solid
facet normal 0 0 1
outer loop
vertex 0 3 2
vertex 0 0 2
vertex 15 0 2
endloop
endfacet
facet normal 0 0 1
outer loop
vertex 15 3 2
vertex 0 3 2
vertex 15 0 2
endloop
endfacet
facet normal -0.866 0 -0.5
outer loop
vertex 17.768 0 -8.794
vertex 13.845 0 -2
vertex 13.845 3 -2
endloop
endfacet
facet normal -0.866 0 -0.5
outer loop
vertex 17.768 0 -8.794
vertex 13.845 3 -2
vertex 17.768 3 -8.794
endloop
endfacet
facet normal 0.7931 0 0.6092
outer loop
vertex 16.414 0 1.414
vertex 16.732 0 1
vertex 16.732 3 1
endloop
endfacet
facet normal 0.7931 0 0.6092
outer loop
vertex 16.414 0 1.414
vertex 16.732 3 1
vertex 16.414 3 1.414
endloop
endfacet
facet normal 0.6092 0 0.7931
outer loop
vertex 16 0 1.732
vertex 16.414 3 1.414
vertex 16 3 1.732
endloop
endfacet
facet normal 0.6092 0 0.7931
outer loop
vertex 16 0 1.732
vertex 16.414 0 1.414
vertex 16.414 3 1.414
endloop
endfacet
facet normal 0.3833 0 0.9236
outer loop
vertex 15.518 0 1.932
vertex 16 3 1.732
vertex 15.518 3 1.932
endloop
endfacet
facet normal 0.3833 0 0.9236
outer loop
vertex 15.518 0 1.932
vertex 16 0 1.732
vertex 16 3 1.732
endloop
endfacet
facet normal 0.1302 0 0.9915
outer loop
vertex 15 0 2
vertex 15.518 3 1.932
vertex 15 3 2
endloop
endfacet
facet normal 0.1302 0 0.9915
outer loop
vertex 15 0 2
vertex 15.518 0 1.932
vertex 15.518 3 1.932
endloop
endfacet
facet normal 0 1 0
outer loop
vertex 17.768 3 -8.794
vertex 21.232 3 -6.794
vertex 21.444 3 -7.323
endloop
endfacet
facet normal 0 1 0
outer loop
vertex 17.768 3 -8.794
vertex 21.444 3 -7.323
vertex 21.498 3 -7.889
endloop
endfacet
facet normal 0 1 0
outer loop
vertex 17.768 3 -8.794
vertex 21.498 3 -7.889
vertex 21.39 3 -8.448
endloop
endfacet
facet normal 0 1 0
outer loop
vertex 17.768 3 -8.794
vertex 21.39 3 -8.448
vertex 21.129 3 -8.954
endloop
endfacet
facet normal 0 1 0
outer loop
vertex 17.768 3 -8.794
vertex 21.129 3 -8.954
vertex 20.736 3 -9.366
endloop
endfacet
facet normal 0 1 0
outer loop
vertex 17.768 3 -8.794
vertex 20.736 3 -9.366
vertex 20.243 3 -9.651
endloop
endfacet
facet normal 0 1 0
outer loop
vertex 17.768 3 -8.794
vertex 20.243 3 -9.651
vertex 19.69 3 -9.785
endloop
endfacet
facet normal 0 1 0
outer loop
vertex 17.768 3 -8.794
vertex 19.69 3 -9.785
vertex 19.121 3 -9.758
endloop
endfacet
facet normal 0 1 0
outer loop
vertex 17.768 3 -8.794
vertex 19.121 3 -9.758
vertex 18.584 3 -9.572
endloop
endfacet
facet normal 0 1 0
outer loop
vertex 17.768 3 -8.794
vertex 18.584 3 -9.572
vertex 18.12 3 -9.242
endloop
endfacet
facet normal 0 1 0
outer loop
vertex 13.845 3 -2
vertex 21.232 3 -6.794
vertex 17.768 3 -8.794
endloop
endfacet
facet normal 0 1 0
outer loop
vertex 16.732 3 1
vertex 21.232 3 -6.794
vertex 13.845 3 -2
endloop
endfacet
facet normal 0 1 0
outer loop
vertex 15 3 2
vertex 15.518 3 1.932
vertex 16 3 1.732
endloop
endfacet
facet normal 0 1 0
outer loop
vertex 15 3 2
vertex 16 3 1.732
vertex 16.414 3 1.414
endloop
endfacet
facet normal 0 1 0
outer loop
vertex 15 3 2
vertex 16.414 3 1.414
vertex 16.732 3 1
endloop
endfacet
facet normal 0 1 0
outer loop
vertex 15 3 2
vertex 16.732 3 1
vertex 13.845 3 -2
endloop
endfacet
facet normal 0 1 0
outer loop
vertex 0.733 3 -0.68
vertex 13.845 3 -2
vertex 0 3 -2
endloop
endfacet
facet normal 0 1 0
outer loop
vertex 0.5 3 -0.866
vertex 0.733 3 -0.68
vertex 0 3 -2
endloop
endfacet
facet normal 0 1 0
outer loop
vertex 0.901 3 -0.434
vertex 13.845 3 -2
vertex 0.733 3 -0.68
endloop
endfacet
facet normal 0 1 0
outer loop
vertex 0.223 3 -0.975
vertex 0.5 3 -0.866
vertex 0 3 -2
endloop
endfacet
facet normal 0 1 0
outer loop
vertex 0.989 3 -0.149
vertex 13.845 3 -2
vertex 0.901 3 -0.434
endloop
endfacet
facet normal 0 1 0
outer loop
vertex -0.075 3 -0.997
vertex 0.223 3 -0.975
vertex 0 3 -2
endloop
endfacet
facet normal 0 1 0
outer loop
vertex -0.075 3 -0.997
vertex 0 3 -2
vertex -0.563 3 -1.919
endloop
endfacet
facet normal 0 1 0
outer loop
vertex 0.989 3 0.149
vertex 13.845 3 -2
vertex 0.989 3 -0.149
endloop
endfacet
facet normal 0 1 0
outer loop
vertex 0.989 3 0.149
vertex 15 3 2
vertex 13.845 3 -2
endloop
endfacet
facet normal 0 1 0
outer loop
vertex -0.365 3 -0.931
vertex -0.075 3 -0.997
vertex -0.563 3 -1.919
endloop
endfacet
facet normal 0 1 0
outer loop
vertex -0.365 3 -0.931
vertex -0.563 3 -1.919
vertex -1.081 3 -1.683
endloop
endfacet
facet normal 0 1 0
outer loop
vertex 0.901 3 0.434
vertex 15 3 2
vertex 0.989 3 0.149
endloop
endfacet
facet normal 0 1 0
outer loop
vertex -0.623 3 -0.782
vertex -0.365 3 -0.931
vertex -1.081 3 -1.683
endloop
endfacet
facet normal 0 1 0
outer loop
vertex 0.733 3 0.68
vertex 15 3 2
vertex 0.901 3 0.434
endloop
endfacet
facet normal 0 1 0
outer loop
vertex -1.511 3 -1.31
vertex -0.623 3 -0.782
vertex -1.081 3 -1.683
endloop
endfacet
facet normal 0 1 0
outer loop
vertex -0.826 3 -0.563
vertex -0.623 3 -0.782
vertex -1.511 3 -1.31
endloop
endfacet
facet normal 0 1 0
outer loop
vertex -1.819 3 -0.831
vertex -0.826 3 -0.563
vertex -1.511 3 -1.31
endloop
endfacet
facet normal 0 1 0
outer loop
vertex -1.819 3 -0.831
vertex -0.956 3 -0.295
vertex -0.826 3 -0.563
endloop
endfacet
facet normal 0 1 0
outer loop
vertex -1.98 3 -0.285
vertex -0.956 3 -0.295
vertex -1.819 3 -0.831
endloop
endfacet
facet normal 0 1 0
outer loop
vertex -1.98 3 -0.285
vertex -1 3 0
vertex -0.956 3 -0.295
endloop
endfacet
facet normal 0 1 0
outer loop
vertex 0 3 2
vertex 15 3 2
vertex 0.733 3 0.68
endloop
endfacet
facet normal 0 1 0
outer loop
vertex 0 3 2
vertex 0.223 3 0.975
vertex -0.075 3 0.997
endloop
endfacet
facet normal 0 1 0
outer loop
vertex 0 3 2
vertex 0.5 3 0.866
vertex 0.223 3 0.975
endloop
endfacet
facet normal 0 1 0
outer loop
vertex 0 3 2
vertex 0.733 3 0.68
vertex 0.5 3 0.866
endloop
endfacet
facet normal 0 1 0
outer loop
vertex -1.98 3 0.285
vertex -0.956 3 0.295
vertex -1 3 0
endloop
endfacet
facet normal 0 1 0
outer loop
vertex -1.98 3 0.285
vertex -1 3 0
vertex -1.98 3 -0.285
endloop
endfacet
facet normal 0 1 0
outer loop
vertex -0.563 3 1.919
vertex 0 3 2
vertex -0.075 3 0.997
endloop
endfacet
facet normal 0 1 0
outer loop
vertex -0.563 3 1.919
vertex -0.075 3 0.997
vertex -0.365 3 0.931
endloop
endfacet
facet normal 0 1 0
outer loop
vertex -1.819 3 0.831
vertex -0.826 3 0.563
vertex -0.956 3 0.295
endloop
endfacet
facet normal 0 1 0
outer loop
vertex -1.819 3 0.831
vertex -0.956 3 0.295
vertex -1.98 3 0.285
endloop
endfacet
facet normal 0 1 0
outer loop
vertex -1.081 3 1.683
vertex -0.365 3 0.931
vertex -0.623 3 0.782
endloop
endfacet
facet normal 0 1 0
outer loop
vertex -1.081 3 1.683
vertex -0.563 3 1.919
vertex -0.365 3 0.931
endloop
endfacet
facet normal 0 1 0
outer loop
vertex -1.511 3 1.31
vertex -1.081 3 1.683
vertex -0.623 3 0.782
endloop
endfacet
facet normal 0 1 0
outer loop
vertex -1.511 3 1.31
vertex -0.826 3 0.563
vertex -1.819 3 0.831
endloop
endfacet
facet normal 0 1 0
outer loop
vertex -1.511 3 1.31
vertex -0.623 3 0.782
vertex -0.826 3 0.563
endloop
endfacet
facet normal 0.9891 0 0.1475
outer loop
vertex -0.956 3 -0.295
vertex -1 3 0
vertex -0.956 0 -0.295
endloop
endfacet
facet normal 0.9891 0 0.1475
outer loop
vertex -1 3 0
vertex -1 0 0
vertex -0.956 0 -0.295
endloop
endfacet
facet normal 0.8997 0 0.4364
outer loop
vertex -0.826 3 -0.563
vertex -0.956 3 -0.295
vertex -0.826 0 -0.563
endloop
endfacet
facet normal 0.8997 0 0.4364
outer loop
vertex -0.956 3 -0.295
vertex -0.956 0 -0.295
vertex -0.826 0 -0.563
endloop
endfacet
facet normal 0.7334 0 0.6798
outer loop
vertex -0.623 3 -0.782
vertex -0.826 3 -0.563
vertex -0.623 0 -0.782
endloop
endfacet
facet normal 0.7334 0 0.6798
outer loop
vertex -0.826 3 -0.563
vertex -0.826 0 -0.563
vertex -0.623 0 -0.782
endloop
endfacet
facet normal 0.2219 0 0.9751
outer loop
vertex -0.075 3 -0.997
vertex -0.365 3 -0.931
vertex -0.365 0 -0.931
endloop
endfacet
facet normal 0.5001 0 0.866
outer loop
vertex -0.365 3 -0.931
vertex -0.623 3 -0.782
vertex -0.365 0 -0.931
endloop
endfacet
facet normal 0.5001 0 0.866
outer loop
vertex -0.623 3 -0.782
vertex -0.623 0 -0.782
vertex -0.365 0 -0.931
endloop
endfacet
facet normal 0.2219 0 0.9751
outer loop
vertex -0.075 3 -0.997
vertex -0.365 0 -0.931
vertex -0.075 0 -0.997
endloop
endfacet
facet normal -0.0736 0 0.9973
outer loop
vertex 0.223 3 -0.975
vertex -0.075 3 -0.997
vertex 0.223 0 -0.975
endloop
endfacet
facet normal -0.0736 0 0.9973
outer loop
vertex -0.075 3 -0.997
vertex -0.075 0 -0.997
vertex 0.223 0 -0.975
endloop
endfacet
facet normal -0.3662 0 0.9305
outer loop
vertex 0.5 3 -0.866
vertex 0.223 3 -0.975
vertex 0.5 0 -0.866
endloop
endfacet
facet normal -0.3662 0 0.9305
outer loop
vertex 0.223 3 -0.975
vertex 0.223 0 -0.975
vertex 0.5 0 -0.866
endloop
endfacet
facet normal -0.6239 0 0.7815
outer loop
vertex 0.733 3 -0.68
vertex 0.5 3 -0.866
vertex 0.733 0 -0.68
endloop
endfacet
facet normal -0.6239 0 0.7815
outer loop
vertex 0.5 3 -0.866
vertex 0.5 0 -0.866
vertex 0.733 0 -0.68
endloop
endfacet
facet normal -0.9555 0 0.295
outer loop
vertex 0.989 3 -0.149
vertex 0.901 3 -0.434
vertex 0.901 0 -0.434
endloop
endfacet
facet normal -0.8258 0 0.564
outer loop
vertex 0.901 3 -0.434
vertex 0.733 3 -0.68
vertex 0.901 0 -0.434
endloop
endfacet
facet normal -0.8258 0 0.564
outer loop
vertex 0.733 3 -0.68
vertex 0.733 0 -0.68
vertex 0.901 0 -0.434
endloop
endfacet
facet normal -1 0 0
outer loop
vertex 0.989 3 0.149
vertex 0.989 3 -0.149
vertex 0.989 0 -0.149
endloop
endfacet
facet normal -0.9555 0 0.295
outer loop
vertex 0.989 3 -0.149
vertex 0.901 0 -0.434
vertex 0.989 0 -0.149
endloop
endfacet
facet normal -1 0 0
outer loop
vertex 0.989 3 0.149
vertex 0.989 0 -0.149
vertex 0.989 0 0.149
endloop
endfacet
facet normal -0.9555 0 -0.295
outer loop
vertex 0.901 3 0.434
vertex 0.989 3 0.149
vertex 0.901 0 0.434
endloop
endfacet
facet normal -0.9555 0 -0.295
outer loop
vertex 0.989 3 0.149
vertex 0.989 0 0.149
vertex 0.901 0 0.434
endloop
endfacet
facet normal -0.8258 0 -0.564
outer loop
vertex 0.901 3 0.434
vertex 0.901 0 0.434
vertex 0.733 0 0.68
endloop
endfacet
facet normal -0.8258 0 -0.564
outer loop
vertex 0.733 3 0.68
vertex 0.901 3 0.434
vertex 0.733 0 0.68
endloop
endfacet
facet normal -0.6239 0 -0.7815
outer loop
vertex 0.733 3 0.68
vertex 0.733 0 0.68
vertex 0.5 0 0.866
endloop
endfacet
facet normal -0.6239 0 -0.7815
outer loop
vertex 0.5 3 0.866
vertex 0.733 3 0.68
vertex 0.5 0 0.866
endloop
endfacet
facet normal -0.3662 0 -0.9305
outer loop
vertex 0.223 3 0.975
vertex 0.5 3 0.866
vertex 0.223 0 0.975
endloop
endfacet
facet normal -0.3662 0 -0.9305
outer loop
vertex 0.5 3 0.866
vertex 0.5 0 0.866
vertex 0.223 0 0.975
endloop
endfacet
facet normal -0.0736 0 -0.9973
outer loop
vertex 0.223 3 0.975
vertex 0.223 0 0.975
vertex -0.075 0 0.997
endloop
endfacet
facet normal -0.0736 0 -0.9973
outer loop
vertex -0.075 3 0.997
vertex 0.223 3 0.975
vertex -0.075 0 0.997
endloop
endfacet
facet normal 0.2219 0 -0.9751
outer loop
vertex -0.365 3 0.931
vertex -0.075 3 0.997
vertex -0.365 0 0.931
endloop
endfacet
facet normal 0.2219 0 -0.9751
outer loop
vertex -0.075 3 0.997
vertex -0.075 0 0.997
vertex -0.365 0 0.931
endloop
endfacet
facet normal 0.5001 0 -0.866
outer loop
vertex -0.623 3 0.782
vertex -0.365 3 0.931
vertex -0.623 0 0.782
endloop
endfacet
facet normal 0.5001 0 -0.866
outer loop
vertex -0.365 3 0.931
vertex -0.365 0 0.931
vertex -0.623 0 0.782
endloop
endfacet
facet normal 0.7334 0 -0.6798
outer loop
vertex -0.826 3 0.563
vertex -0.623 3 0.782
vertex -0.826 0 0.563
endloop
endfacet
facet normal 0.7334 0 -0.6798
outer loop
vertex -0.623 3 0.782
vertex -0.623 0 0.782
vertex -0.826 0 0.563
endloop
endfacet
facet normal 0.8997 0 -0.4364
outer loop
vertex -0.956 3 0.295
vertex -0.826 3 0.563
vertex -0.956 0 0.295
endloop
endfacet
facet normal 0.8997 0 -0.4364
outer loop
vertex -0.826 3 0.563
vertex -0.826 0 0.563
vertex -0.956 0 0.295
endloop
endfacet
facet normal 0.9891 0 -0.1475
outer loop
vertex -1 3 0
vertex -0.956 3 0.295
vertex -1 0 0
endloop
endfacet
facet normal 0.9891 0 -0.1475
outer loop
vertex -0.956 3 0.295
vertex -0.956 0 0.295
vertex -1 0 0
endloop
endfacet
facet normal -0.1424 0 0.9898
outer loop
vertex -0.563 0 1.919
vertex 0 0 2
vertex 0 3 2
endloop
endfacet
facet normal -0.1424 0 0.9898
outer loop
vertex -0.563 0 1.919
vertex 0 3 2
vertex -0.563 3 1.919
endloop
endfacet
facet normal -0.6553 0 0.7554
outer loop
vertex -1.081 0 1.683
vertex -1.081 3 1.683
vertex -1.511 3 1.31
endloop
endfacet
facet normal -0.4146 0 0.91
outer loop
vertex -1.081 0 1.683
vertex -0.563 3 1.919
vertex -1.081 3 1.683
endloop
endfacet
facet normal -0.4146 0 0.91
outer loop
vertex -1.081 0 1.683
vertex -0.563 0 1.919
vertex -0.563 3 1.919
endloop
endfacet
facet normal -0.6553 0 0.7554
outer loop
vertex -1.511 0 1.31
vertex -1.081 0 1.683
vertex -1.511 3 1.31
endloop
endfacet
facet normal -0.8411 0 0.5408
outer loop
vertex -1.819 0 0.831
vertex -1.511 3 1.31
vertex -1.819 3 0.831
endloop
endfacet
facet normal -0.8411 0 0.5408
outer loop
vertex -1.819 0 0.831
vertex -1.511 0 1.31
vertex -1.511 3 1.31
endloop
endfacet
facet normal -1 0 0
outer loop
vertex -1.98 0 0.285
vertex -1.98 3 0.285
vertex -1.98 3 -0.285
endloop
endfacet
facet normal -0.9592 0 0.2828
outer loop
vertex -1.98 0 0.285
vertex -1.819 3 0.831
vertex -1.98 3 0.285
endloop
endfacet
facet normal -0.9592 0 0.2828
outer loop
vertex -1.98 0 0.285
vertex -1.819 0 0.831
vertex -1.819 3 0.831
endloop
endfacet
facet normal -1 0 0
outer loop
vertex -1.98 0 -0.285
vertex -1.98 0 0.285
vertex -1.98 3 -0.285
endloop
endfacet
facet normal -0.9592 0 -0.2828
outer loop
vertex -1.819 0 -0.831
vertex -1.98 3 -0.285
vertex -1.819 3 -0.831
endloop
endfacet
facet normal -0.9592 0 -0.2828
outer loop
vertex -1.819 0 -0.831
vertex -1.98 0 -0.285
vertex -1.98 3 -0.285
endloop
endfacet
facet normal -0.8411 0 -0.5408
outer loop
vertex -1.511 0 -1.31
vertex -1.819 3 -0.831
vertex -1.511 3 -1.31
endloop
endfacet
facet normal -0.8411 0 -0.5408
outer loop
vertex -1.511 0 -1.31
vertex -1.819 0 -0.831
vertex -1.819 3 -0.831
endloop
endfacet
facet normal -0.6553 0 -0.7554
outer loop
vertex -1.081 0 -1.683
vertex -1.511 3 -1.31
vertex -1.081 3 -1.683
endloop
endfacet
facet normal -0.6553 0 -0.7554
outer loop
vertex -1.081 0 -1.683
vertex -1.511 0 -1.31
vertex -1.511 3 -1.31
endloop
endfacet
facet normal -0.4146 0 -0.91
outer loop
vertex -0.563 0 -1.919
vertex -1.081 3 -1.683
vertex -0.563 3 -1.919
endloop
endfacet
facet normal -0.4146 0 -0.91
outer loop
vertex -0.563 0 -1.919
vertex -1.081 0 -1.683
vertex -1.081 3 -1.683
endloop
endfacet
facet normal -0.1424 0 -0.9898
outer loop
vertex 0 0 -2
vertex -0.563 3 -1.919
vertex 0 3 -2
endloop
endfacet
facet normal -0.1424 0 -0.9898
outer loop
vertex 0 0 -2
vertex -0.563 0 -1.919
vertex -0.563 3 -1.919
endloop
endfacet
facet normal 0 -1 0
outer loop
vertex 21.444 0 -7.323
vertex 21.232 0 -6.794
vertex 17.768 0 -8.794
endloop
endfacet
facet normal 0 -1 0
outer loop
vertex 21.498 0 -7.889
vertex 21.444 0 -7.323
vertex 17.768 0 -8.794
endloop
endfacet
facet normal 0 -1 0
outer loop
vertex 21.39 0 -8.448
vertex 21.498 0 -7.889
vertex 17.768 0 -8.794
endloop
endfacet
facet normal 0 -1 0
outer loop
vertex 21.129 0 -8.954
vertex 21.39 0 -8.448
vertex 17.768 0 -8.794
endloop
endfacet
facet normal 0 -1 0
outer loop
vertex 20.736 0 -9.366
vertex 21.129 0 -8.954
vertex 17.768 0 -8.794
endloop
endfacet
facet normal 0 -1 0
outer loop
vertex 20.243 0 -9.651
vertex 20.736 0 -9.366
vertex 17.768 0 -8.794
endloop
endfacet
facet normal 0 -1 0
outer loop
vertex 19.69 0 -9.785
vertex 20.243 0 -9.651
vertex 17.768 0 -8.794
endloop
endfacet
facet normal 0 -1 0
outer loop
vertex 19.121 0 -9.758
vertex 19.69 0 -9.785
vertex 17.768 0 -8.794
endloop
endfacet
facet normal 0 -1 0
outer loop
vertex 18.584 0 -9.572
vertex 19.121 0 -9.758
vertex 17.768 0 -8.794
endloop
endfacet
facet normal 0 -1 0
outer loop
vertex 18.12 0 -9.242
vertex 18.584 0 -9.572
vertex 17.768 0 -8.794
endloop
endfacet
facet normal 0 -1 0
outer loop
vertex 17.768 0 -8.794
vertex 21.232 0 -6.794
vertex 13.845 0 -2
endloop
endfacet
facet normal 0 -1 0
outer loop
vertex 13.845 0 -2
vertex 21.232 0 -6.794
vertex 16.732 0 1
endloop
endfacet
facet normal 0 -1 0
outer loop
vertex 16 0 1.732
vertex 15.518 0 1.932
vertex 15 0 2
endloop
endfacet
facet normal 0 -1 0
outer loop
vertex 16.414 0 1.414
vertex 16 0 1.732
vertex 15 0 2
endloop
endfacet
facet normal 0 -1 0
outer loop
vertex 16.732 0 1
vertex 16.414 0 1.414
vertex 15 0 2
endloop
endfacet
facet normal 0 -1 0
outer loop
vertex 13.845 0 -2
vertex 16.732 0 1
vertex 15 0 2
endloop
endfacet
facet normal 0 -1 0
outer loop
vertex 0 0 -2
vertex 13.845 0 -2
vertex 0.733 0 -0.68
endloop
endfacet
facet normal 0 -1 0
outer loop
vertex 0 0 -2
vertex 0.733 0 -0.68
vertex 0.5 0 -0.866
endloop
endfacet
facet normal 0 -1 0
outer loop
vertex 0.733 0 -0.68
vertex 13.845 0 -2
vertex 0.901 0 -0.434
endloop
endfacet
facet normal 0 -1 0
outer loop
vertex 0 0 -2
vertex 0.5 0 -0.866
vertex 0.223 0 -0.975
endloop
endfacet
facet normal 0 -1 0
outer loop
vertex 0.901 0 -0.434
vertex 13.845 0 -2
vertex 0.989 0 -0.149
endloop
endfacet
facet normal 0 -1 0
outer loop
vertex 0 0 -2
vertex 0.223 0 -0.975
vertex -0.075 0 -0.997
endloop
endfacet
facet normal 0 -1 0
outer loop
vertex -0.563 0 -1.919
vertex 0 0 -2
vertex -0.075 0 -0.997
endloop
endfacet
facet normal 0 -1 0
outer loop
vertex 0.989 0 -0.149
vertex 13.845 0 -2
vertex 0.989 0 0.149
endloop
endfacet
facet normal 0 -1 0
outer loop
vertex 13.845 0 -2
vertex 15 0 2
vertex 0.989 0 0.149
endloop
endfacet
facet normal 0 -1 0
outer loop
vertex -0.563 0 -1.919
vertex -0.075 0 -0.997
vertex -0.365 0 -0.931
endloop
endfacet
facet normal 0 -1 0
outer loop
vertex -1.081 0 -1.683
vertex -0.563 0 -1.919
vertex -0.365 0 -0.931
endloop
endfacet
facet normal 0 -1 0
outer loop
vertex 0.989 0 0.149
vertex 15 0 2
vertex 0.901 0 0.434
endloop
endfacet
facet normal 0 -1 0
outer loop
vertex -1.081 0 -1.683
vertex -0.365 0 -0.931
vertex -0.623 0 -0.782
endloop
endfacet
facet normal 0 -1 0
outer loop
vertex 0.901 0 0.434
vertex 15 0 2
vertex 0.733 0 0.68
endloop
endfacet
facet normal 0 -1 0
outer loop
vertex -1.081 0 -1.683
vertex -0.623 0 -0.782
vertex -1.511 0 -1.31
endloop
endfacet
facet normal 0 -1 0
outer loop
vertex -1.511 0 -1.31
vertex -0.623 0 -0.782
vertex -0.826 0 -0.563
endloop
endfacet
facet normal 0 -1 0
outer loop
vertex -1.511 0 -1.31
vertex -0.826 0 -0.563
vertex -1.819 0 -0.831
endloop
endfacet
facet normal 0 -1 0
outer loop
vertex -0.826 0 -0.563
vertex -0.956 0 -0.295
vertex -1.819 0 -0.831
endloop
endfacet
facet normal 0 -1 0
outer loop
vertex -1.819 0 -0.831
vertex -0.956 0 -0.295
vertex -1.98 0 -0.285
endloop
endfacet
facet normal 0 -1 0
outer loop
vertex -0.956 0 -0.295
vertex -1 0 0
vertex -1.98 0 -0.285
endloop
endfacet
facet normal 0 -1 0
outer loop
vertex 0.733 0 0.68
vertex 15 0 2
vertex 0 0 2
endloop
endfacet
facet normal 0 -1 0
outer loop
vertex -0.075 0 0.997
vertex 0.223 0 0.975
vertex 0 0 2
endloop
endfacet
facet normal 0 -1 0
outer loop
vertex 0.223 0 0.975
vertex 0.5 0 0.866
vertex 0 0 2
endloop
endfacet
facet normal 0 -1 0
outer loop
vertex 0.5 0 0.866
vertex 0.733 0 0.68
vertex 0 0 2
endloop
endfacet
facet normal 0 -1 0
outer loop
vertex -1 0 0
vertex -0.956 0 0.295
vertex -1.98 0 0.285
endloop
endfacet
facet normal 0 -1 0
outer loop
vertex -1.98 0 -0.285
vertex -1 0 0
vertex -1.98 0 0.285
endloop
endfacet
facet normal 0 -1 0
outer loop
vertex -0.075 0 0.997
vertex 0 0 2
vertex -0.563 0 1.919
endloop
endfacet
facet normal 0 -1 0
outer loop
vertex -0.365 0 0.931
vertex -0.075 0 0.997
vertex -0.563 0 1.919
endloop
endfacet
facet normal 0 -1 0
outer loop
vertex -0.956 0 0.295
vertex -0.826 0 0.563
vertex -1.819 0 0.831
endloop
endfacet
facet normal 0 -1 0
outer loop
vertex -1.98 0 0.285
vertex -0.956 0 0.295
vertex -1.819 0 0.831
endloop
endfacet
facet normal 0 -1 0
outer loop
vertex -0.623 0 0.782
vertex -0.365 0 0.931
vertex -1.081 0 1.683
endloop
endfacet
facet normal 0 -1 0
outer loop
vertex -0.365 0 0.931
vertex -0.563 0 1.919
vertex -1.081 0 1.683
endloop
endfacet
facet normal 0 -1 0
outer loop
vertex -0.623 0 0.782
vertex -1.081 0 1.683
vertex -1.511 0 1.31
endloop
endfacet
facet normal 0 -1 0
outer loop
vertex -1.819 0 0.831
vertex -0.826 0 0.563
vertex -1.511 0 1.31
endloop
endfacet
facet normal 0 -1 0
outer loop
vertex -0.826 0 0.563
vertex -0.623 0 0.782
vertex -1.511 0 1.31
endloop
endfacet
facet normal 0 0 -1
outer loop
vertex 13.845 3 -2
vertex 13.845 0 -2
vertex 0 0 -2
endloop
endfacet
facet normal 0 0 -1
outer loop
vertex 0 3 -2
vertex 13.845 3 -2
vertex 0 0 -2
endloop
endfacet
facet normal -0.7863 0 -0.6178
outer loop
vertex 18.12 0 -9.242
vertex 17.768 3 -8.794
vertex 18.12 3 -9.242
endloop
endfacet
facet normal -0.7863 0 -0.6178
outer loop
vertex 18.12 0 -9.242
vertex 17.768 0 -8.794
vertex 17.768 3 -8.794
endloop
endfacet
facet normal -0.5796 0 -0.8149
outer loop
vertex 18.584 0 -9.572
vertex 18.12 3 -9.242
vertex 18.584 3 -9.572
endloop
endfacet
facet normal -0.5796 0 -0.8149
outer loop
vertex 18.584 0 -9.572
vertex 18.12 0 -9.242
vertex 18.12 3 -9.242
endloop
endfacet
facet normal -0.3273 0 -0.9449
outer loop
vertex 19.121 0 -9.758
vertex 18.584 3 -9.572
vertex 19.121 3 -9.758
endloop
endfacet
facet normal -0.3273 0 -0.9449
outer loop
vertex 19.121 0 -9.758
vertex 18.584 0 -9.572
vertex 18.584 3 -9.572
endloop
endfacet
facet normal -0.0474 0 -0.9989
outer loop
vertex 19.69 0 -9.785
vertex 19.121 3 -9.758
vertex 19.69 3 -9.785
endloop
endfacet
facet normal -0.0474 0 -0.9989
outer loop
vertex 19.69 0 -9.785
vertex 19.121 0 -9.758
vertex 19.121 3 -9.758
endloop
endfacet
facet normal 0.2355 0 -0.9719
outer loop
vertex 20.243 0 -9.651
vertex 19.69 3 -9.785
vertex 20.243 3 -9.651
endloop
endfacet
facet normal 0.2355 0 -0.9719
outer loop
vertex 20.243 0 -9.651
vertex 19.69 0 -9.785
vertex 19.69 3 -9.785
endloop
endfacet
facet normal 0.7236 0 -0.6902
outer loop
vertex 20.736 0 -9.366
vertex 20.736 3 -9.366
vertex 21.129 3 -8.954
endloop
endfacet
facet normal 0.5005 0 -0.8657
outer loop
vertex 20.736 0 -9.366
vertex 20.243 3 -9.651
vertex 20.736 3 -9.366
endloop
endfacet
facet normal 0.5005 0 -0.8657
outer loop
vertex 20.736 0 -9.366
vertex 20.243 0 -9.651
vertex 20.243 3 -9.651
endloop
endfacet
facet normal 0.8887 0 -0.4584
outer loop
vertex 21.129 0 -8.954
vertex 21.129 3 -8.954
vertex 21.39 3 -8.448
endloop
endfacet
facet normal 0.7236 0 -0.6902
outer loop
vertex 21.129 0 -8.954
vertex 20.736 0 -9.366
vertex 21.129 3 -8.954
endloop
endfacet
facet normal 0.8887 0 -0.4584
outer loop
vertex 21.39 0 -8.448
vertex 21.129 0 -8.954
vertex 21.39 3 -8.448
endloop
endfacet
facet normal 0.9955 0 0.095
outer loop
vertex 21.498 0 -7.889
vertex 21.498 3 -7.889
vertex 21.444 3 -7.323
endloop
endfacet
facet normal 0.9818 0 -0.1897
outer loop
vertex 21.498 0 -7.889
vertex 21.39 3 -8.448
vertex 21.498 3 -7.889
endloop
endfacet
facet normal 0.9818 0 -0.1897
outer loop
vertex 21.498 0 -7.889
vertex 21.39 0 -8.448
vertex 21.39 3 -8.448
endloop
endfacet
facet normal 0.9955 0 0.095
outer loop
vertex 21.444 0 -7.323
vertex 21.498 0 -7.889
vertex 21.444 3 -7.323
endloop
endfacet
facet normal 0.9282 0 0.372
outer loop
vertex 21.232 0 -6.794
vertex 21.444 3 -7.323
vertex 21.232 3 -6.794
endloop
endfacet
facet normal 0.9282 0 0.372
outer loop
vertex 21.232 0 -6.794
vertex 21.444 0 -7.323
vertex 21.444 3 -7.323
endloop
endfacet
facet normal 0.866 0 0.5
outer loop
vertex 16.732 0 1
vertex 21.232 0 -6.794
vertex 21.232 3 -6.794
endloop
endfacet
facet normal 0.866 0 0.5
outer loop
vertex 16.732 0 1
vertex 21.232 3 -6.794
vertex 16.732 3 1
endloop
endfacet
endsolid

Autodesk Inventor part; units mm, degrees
ref_plane "YZ Plane" through (0, 0, 0) normal (1, 0, 0) x (0, 1, 0)
ref_plane "XZ Plane" through (0, 0, 0) normal (0, 1, 0) x (-1, 0, 0)
ref_plane "XY Plane" through (0, 0, 0) normal (0, 0, 1) x (1, 0, 0)
sketch "草图1" plane through (0, 0, 0) normal (0, 1, 0) x (-1, 0, 0)
  line L0 (0, 0) -> (-15, 0) construction
  line L1 (0, 2) -> (-15, 2)
  line L2 (-15, -2) -> (0, -2)
  arc A0 (0, -2) -> (0, 2) centre (0, 0) ccw
  arc A1 (-15, 2) -> (-15, -2) centre (-15, 0) ccw
  line L3 (-15, 0) -> (-19.5, -7.7942) construction
  line L4 (-13.2679, -1) -> (-17.7679, -8.7942)
  line L5 (-21.2321, -6.7942) -> (-16.7321, 1)
  arc A2 (-13.2679, -1) -> (-16.7321, 1) centre (-15, 0) ccw
  arc A3 (-21.2321, -6.7942) -> (-17.7679, -8.7942) centre (-19.5, -7.7942) ccw
  line L6 (-15, 0) -> (-6, 0) construction
  circle A4 centre (0, 0) radius 1
  point P0 (-7.5, 0)
  point P1 (-17.25, -3.8971)
  point P2 (-16.7321, 1)
  point P3 (-13.8453, -2)
  dimension "d0" = 15
  dimension "d1" = 2
  dimension "d2" = 9
  dimension "d3" = 120
  dimension "d4" = 2
extrude "拉伸1" add sketch "草图1" along normal blind 3
properties part number "夹爪01"
